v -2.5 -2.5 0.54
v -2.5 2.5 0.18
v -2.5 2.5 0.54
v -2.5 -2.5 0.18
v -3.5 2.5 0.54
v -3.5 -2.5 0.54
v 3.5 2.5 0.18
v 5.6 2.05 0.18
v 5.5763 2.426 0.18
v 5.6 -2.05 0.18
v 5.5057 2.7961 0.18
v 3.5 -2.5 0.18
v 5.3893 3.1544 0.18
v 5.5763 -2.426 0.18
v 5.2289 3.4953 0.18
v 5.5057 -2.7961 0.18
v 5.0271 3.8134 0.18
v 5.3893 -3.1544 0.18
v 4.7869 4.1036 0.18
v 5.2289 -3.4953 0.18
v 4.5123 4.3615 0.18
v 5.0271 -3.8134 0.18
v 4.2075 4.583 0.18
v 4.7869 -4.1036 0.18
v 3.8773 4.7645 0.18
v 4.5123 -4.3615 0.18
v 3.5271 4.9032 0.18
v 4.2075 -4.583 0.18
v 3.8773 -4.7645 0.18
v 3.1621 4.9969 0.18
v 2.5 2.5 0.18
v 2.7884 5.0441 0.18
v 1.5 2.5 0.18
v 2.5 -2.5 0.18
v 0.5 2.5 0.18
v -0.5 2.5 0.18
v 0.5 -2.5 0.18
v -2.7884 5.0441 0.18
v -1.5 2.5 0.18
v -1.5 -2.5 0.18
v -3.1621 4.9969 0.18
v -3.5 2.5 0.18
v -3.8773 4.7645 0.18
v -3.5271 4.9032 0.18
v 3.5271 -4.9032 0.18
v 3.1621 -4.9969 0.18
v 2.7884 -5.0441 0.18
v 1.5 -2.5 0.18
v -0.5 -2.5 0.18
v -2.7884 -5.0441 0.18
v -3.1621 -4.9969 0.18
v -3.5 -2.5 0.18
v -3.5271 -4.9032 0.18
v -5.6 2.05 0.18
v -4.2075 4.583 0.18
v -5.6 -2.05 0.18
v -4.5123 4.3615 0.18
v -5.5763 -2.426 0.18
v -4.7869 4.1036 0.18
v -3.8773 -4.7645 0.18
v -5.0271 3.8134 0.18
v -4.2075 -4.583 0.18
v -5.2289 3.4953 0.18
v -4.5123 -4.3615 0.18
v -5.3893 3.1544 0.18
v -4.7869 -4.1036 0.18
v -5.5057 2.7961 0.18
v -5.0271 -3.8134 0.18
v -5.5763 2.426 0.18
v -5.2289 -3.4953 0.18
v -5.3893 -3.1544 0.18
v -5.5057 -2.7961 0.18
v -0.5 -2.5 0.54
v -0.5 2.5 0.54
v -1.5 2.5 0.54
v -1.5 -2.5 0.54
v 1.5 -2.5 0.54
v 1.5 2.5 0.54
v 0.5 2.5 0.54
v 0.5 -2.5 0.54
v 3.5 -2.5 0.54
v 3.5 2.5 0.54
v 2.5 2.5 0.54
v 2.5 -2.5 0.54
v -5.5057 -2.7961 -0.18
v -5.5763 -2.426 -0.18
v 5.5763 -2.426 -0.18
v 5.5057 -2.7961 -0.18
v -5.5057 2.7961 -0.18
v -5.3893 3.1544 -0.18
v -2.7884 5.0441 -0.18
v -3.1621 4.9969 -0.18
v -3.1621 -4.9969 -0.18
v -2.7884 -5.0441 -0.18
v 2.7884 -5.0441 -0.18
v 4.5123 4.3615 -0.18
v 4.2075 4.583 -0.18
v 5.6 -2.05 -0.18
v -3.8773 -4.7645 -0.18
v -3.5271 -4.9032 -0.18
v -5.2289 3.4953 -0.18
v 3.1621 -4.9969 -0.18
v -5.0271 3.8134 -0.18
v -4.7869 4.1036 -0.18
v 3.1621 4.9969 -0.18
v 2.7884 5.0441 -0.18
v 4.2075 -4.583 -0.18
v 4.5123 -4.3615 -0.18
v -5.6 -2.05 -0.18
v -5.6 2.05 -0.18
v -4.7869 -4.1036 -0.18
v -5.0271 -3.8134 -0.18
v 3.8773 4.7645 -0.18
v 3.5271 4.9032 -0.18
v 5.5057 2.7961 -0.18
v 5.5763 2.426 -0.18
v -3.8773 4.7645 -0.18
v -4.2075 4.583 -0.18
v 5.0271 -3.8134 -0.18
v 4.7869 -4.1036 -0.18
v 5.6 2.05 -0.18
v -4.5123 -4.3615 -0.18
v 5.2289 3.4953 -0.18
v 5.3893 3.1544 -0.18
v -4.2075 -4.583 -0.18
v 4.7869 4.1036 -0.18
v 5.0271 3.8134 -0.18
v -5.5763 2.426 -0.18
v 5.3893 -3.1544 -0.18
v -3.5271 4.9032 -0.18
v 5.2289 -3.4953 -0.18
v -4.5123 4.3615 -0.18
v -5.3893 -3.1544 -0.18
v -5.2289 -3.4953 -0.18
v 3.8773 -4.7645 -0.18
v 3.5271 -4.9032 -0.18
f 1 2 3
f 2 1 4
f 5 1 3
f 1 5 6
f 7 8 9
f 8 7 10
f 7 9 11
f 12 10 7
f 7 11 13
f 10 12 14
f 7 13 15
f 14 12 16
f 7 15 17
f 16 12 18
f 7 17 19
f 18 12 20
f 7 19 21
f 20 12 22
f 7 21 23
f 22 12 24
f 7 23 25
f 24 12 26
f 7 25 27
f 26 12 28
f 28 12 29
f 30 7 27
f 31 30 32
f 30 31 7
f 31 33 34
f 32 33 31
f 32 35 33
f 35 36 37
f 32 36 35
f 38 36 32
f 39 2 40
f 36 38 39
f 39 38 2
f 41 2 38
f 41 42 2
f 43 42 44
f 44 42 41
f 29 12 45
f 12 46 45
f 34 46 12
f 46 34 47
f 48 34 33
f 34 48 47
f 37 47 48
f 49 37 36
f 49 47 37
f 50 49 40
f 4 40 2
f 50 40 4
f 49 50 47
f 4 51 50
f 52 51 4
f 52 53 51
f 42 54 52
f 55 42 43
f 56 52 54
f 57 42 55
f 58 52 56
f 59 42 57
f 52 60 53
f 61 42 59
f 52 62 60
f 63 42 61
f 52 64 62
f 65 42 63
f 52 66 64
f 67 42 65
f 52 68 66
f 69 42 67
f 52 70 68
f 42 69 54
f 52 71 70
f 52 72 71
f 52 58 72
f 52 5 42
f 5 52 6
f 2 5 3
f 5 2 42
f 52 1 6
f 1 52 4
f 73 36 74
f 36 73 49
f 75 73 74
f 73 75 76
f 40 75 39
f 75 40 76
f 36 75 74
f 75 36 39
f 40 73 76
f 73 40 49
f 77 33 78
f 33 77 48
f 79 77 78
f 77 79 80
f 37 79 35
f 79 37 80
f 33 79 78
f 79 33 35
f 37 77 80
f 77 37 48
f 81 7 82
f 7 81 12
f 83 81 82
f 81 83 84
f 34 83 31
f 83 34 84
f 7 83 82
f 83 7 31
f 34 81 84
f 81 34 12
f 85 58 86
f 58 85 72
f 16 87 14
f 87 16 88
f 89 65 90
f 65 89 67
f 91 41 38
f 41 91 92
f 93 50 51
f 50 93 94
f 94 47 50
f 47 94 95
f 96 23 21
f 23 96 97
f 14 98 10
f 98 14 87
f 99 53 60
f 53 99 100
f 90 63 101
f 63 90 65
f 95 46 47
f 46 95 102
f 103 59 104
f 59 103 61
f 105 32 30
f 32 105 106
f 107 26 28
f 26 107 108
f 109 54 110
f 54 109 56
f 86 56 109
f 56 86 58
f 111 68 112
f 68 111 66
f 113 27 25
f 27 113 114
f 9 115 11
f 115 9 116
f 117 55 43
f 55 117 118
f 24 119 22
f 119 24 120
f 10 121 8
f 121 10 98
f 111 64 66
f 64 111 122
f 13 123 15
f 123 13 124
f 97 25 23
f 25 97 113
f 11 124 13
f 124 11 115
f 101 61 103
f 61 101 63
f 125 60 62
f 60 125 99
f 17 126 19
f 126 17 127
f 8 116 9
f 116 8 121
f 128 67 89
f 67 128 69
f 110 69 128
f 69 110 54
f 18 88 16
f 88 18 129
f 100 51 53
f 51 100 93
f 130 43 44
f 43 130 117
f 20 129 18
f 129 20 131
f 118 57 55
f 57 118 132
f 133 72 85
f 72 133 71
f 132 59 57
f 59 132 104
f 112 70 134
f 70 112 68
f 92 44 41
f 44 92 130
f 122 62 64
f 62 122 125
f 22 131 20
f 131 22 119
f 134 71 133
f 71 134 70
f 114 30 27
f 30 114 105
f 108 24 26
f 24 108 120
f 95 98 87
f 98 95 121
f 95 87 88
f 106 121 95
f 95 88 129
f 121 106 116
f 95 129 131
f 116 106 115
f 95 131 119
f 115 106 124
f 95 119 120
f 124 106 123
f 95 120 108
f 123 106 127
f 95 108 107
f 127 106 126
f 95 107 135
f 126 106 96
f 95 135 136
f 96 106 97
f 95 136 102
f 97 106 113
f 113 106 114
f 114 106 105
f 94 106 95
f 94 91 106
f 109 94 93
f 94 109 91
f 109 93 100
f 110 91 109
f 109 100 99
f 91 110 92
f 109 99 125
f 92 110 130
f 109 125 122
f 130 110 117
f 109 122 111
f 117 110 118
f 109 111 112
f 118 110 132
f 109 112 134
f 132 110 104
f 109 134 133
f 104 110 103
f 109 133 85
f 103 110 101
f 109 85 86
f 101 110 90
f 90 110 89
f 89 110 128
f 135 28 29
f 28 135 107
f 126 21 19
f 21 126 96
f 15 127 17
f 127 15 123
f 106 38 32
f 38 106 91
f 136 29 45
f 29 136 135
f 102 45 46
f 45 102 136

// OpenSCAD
// file: Parameter.scad
$fn=50;
overlap=0.006;
thinnestLayerOfPrinter=0.12;

baseX=23;
baseY=11;
baseZ=thinnestLayerOfPrinter*2;

wallZ=thinnestLayerOfPrinter*5;
wallThickness=0.5;

coverZ=thinnestLayerOfPrinter*2;

cornerRadius=4;

holeDeltaX=6.0;
holeDiameter=8;

deltaSlider=0.4;
sliderX=12-deltaSlider*2;
sliderY=baseY-wallThickness-deltaSlider;
sliderZ=thinnestLayerOfPrinter*3;
// main file
include <Parameter.scad>


slider();


module slider(){
    color("#555555")
    sliderBase();
    color("#aaaaaa")
    handle();
}

module sliderBase(){
    radius=cornerRadius-wallThickness*2;
    hull()
    {
        translate([-sliderX/2+radius,-sliderY/2+radius,0])
        cylinder(h=sliderZ,r=radius,center=true);
        translate([sliderX/2-radius,-sliderY/2+radius,0])
        cylinder(h=sliderZ,r=radius,center=true);
        translate([-sliderX/2+radius,sliderY/2-radius,0])
        cylinder(h=sliderZ,r=radius,center=true);
        translate([sliderX/2-radius,sliderY/2-radius,0])
        cylinder(h=sliderZ,r=radius,center=true);
    }
}

module handle(){
    for(x=[-3:2:3]){
        translate([x,0,sliderZ])
        cube([1,5,0.36],center=true);
    }
}
